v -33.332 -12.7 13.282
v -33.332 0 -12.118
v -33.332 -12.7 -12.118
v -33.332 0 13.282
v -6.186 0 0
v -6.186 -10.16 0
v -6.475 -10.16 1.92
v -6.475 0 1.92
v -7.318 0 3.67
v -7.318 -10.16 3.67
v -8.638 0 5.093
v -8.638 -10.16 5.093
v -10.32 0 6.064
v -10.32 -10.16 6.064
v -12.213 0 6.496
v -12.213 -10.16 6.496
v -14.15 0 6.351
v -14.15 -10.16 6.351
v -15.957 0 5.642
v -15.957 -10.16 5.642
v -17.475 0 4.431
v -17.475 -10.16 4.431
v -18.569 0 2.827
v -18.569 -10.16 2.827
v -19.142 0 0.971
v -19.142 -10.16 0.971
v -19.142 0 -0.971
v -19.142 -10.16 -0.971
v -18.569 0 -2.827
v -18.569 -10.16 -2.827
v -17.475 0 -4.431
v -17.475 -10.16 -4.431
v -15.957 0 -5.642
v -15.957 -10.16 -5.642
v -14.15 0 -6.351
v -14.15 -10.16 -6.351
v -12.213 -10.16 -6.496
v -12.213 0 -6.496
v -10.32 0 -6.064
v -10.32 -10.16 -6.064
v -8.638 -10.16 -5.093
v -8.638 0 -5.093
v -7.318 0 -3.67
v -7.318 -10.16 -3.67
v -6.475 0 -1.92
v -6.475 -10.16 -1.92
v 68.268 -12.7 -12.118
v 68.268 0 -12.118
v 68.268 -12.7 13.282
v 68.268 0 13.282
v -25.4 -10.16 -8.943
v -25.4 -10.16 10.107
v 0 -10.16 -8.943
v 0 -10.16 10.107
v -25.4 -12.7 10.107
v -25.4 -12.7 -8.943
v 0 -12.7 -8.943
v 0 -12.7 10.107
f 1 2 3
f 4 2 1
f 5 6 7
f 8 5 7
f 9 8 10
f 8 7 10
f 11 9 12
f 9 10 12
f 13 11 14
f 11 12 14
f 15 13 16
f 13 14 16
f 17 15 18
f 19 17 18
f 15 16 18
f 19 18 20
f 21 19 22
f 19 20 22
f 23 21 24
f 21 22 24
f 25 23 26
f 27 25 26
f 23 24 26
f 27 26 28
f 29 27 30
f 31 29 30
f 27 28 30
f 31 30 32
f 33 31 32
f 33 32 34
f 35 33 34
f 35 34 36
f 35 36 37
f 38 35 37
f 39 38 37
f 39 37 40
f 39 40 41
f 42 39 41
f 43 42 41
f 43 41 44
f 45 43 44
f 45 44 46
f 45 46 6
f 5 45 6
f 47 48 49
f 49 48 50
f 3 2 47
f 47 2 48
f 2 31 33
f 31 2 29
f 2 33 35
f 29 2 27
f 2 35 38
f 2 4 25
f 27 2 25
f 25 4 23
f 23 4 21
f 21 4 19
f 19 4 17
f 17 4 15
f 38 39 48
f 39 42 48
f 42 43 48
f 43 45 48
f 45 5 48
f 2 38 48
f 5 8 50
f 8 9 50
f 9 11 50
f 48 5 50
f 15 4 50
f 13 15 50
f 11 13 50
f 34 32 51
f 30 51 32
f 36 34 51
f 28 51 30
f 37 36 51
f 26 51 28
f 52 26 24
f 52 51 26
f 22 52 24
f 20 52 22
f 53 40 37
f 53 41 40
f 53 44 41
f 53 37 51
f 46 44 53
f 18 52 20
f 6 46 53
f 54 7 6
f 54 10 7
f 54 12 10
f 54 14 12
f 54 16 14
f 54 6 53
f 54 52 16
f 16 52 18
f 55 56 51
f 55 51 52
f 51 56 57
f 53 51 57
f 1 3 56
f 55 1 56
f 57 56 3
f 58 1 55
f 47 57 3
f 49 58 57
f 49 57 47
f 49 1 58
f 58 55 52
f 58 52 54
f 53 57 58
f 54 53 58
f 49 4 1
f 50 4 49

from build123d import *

# Parameters (mm, degrees)
F0_W     = 101.6
F0_H     = 25.4
F1_DEPTH = 12.7
F2_W     = 25.4
F2_H     = 19.05
F3_DEPTH = 2.54
F5_DEPTH = 25.4


with BuildPart() as f1:
    # F0 (on Front) → F1 (new body)
    with BuildSketch(Plane.XZ):
        with Locations((17.4680363059, 0.5822056818)):
            Rectangle(F0_W, F0_H)
    extrude(amount=F1_DEPTH)

    # F2 (on face) → F3 (cut)
    with BuildSketch(Plane.XZ.offset(12.7)):
        with Locations((-12.7, 0.5822056818)):
            Rectangle(F2_W, F2_H)
    extrude(amount=-F3_DEPTH, mode=Mode.SUBTRACT)

    # F4 (on face) → F5 (cut)
    with BuildSketch(Plane.XZ.offset(10.16)):
        with BuildLine():
            ThreePointArc((-19.21444736, 0), (-12.7, -6.51444736), (-6.18555264, 0))
            Line((-6.18555264, 0), (-19.21444736, 0))
        make_face()
        with BuildLine():
            Line((-19.21444736, 0), (-6.18555264, 0))
            ThreePointArc((-6.18555264, 0), (-12.7, 6.51444736), (-19.21444736, 0))
        make_face()
    extrude(amount=-F5_DEPTH, mode=Mode.SUBTRACT)


solid = f1.part
